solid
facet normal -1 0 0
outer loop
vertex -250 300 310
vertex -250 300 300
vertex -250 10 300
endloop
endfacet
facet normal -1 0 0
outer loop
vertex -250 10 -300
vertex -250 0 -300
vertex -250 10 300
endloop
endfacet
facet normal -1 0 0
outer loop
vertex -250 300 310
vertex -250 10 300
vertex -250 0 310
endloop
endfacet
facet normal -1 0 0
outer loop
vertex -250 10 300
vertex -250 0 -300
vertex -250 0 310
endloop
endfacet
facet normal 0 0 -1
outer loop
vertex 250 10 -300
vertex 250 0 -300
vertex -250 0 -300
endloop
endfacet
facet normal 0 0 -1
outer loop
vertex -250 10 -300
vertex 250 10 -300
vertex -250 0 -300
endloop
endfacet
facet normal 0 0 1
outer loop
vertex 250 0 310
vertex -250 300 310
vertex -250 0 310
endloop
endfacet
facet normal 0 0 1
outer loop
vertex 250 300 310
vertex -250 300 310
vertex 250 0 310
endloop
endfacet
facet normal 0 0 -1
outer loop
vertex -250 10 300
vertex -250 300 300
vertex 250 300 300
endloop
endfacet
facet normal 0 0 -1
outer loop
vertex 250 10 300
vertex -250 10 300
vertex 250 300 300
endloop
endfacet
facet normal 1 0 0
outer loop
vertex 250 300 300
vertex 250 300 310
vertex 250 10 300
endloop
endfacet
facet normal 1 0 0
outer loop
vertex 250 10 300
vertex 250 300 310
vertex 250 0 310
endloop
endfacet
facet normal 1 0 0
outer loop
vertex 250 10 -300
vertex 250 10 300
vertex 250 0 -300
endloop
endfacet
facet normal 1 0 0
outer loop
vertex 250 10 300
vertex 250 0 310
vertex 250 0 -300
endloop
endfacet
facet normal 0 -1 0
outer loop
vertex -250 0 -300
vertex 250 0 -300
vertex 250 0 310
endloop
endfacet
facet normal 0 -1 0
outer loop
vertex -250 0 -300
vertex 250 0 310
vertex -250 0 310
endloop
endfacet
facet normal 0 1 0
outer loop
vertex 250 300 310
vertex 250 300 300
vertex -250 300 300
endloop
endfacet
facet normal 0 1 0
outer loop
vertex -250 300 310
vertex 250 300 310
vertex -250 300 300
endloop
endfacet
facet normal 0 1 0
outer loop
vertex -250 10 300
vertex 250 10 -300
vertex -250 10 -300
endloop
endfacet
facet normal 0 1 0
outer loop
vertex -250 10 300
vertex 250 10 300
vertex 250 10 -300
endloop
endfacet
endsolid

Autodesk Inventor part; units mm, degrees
ref_plane "YZ Plane" through (0, 0, 0) normal (1, 0, 0) x (0, 1, 0)
ref_plane "XZ Plane" through (0, 0, 0) normal (0, 1, 0) x (-1, 0, 0)
ref_plane "XY Plane" through (0, 0, 0) normal (0, 0, 1) x (1, 0, 0)
sketch "Sketch1" plane through (0, 0, 0) normal (0, 1, 0) x (-1, 0, 0)
  line L0 (10.2019, 0) -> (-11.9707, 0)
  line L1 (0, 17.6887) -> (0, -16.1667)
  line L2 (250, 300) -> (-250, 300)
  line L3 (-250, 300) -> (-250, -300)
  line L4 (-250, -300) -> (250, -300)
  line L5 (250, -300) -> (250, 300)
  point P0 (0, 0)
  dimension "d0" = 600
  dimension "d1" = 500
extrude "Extrusion1" add sketch "Sketch1" along normal blind 10
sketch "Sketch2" plane through (-250, 0, 300) normal (0, 0, 1) x (1, 0, 0)
  line L0 (0, 0) -> (500, 0)
  line L1 (500, 0) -> (500, 300)
  line L2 (500, 300) -> (0, 300)
  line L3 (0, 300) -> (0, 0)
  point P0 (250, 0)
  dimension "d4" = 300
  dimension "d5" = 500
extrude "Extrusion2" add sketch "Sketch2" along normal blind 10
properties part number "ground"
